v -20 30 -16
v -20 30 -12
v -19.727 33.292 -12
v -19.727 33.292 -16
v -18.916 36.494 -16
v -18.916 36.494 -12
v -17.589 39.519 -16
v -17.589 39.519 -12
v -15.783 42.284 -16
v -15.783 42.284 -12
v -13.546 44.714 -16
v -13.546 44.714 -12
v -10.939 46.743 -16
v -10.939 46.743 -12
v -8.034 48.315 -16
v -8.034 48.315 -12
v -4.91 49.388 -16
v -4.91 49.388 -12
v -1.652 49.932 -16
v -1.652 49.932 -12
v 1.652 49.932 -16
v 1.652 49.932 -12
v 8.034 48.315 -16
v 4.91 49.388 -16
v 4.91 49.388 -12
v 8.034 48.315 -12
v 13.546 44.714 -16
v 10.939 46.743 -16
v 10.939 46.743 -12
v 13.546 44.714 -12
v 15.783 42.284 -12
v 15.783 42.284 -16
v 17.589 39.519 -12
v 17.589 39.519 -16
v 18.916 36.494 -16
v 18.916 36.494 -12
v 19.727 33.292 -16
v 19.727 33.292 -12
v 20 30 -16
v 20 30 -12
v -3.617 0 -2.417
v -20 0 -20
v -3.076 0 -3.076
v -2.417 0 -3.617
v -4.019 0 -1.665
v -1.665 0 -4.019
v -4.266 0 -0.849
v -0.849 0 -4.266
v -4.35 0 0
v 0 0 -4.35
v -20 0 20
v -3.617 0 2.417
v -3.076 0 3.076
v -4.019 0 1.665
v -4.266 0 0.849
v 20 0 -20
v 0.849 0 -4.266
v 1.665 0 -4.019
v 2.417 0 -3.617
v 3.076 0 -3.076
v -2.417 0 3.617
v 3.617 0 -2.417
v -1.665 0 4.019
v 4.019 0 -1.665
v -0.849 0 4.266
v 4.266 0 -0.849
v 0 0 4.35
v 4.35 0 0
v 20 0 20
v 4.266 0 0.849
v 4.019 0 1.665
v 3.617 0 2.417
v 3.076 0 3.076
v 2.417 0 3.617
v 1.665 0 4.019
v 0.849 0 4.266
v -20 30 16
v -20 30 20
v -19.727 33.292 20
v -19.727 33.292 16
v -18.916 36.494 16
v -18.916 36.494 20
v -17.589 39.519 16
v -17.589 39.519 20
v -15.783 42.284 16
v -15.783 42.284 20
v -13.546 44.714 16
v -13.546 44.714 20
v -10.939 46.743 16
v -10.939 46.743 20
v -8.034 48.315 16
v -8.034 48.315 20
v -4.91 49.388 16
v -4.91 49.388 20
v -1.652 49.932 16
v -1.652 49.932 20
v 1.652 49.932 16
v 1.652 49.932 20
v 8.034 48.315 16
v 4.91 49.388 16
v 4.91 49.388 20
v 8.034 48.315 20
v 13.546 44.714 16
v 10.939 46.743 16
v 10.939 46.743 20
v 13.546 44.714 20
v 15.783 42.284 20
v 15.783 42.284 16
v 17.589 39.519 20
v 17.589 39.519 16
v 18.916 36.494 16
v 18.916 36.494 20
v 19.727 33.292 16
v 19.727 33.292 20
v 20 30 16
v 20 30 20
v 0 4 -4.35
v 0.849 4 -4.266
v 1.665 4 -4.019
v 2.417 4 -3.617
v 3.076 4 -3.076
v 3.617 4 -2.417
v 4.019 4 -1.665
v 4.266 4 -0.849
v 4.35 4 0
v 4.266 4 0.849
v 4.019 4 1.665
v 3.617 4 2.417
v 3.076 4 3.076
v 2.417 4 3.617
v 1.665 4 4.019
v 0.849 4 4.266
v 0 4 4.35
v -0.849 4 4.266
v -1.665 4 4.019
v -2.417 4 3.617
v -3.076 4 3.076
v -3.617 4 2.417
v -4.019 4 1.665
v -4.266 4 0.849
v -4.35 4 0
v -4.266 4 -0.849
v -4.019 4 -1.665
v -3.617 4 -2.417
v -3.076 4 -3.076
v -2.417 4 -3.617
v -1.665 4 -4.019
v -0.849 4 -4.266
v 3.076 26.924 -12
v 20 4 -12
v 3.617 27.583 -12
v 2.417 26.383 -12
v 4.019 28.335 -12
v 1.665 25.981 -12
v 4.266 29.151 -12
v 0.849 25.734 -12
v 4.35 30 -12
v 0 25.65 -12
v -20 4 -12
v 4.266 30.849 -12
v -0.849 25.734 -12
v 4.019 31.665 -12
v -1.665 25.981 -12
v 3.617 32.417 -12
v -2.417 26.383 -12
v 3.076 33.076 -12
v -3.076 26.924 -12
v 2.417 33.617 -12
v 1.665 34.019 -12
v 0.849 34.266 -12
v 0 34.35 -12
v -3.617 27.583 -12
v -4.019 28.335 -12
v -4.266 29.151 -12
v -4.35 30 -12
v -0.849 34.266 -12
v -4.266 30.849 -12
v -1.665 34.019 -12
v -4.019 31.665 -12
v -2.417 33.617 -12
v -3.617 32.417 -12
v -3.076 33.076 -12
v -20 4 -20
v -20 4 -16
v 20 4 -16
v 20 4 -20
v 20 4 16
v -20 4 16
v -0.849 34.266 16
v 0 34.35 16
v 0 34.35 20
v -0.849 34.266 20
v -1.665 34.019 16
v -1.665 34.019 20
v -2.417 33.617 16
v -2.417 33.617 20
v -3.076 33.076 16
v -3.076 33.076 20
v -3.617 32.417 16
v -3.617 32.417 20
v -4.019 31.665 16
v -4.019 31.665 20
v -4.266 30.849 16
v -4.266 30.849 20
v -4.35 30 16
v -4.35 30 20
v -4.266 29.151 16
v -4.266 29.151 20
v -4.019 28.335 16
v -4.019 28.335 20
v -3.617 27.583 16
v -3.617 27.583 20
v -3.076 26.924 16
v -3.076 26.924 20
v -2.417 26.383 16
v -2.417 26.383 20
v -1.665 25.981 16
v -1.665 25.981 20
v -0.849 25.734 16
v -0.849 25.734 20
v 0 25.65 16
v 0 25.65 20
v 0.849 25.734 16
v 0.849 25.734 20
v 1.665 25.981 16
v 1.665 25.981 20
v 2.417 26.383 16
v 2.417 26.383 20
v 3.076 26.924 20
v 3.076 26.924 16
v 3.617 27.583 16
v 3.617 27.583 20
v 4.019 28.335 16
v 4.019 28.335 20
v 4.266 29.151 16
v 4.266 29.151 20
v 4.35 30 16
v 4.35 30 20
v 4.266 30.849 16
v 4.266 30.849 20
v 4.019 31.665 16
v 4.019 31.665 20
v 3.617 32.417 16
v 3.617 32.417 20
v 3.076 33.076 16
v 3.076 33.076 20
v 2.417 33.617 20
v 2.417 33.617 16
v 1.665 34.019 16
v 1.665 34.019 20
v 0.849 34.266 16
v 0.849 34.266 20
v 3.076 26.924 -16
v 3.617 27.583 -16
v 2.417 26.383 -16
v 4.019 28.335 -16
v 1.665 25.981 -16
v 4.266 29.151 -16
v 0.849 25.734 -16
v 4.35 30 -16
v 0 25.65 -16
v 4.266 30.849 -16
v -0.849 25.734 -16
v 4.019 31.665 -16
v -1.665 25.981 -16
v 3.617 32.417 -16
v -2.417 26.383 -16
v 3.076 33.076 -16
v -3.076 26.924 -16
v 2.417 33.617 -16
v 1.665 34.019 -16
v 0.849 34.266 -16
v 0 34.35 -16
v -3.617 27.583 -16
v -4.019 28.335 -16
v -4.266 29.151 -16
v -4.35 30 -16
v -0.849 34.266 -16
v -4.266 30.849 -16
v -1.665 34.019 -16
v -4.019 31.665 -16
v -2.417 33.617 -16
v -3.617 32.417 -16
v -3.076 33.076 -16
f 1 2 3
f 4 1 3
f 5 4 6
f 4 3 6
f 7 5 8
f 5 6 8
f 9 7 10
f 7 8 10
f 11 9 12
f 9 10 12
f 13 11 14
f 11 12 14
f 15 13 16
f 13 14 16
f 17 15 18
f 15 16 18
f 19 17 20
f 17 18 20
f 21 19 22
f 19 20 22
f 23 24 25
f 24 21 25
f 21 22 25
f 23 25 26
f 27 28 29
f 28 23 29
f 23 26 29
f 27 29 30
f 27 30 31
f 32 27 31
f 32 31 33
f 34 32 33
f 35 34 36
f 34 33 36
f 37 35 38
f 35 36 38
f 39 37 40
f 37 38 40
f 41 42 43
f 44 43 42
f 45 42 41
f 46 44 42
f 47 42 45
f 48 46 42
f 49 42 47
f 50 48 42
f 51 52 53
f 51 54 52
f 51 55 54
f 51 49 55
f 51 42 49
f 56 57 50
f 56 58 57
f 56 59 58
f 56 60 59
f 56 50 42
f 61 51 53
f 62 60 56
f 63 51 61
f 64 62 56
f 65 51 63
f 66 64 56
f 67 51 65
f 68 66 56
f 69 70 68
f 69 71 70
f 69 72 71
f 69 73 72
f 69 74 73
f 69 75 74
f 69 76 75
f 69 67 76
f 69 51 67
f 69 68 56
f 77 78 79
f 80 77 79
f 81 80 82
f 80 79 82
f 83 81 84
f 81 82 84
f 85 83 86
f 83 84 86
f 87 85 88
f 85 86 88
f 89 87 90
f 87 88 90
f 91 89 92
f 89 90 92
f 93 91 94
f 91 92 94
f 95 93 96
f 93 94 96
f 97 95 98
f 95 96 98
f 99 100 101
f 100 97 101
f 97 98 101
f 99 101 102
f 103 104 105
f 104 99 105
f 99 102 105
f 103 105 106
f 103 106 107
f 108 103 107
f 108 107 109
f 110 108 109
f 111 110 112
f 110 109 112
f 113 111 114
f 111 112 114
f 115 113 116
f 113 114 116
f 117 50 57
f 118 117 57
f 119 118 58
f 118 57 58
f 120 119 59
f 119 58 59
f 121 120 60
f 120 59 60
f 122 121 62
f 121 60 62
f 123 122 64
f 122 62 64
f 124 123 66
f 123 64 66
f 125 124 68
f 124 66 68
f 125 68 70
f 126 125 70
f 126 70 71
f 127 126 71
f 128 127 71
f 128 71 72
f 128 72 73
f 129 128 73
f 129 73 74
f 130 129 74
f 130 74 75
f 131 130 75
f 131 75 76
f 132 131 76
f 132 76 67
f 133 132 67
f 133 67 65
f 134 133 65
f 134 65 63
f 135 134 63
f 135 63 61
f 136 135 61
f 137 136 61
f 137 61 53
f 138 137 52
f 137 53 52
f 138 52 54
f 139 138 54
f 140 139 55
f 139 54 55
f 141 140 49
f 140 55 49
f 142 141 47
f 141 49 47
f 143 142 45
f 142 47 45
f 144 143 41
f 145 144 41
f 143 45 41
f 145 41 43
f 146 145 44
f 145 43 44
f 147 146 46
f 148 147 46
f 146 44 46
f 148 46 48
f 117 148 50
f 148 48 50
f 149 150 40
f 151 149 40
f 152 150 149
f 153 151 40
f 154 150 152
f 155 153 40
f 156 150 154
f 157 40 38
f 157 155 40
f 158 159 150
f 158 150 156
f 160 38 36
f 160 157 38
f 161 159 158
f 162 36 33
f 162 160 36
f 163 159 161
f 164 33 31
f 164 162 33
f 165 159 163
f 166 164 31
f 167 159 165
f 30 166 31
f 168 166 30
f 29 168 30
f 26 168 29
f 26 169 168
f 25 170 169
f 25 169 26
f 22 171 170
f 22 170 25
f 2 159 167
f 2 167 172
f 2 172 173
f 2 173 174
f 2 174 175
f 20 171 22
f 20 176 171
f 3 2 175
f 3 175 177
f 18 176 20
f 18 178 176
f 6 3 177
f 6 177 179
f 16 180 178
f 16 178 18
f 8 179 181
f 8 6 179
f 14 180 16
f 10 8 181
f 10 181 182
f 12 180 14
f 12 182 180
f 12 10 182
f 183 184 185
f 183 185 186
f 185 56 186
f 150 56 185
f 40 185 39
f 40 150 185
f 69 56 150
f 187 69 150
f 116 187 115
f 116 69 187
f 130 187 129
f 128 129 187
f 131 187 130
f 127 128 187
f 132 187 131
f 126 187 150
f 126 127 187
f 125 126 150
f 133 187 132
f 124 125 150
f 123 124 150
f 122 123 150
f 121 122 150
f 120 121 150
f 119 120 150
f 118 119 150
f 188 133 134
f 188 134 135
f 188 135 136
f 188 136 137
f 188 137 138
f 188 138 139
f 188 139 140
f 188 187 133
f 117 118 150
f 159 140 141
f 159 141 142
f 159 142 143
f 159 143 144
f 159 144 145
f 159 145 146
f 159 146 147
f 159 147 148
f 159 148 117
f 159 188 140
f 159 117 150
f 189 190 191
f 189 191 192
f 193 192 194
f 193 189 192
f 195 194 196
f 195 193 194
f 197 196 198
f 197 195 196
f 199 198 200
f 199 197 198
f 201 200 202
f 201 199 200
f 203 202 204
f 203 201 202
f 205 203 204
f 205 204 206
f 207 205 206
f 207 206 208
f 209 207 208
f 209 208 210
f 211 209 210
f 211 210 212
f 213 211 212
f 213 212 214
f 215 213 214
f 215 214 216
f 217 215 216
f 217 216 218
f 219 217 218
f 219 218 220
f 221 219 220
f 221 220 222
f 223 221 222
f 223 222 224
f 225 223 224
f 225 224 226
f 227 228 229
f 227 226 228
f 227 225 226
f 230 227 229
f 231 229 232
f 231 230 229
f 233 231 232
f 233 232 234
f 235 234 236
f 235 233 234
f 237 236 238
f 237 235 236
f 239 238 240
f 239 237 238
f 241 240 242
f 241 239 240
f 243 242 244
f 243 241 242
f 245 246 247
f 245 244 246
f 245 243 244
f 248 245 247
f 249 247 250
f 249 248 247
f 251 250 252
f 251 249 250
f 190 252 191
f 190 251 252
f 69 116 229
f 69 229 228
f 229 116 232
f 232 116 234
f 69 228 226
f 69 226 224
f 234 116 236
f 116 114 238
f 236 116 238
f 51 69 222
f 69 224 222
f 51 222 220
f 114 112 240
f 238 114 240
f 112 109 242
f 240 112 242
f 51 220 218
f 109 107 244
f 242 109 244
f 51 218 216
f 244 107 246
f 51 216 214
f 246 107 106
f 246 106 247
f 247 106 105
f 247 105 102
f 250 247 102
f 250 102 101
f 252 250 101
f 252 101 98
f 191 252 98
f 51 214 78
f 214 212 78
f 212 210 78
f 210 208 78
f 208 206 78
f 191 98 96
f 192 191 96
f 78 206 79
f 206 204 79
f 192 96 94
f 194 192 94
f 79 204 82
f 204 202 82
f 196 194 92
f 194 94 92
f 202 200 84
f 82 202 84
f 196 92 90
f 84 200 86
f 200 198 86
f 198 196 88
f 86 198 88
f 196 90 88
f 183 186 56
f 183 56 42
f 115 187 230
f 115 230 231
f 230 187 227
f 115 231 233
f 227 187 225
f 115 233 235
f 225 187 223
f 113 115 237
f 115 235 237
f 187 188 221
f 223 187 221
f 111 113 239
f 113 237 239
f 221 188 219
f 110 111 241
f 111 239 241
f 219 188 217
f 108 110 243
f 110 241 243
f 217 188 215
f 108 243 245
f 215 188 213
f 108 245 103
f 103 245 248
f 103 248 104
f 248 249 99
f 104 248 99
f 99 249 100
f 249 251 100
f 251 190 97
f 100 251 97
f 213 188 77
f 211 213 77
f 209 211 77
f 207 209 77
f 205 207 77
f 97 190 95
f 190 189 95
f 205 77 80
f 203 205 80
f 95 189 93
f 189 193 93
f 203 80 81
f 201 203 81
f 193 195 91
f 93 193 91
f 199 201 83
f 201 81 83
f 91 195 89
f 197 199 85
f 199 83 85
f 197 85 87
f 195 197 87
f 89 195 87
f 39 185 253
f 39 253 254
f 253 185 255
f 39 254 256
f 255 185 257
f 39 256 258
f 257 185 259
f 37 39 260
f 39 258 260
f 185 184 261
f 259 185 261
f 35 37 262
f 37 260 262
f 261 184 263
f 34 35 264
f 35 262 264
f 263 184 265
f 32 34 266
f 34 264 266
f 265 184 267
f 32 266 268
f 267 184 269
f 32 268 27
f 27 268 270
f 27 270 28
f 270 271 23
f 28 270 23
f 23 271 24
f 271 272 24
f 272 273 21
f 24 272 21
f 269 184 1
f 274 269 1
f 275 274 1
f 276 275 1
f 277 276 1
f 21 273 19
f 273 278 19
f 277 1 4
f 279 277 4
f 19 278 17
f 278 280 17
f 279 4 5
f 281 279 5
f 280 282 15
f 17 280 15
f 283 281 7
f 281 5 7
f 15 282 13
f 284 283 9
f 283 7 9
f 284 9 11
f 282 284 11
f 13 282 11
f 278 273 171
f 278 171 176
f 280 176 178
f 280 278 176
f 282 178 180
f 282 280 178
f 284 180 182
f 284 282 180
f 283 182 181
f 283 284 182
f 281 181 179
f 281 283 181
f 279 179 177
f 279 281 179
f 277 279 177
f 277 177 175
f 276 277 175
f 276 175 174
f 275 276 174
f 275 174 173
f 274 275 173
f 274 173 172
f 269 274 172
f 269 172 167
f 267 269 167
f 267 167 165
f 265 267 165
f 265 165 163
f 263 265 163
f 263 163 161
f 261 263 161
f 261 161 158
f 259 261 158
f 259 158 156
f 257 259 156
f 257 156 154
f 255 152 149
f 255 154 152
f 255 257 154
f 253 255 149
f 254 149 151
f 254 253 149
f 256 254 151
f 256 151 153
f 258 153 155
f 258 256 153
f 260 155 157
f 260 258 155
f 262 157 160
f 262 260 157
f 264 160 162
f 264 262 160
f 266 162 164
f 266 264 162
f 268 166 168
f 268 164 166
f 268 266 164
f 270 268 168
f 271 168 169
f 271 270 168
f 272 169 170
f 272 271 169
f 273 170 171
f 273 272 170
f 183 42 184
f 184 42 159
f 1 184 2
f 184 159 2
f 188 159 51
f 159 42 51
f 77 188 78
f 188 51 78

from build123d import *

# Parameters (mm, degrees)
SKETCH1_W               = 40
SKETCH1_H               = 30
BOSS_EXTRUDE1_DEPTH     = 20
CUT_EXTRUDE1_DEPTH      = 58.445626465
CUT_EXTRUDE1_DEPTH_BACK = 58.445626465
SKETCH2_W               = 28
SKETCH2_H               = 46
SKETCH2_W_2             = 4
CUT_EXTRUDE2_DEPTH      = 68.082039325
CUT_EXTRUDE2_DEPTH_BACK = 68.082039325
SKETCH3_R               = 4.35
SKETCH4_R               = 4.35
CUT_EXTRUDE3_DEPTH      = 58.445626465


with BuildPart() as part:
    # Sketch1 → Boss-Extrude1 (new, symmetric)
    with BuildSketch(Plane.XY):
        with BuildLine():
            ThreePointArc((-20, 30), (0, 50), (20, 30))
            Line((20, 30), (-20, 30))
        make_face()
        with Locations((0, 15)):
            Rectangle(SKETCH1_W, SKETCH1_H)
    extrude(amount=BOSS_EXTRUDE1_DEPTH, both=True)

    # Sketch2 → Cut-Extrude1 (cut, two sides: drawn at the far end of the back side and taken through both)
    with BuildSketch(Plane(origin=(0, 0, 0), x_dir=(0, 0, -1), z_dir=(1, 0, 0)).offset(-CUT_EXTRUDE1_DEPTH_BACK)):
        with Locations((-2, 27)):
            Rectangle(SKETCH2_W, SKETCH2_H)
        with Locations((18, 27)):
            Rectangle(SKETCH2_W_2, SKETCH2_H)
    extrude(amount=CUT_EXTRUDE1_DEPTH + CUT_EXTRUDE1_DEPTH_BACK, mode=Mode.SUBTRACT)

    # Sketch3 → Cut-Extrude2 (cut, two sides: drawn at the far end of the back side and taken through both)
    with BuildSketch(Plane.XY.offset(20).offset(-CUT_EXTRUDE2_DEPTH_BACK)):
        with Locations(Location((0, 30, 0), (0, 0, 90))):
            Circle(SKETCH3_R)
    extrude(amount=CUT_EXTRUDE2_DEPTH + CUT_EXTRUDE2_DEPTH_BACK, mode=Mode.SUBTRACT)

    # Sketch4 → Cut-Extrude3 (cut, through all)
    with BuildSketch(Plane.XZ):
        with Locations(Location((0, 0, 0), (0, 0, 270))):
            Circle(SKETCH4_R)
    extrude(amount=-CUT_EXTRUDE3_DEPTH, mode=Mode.SUBTRACT)


solid = part.part
